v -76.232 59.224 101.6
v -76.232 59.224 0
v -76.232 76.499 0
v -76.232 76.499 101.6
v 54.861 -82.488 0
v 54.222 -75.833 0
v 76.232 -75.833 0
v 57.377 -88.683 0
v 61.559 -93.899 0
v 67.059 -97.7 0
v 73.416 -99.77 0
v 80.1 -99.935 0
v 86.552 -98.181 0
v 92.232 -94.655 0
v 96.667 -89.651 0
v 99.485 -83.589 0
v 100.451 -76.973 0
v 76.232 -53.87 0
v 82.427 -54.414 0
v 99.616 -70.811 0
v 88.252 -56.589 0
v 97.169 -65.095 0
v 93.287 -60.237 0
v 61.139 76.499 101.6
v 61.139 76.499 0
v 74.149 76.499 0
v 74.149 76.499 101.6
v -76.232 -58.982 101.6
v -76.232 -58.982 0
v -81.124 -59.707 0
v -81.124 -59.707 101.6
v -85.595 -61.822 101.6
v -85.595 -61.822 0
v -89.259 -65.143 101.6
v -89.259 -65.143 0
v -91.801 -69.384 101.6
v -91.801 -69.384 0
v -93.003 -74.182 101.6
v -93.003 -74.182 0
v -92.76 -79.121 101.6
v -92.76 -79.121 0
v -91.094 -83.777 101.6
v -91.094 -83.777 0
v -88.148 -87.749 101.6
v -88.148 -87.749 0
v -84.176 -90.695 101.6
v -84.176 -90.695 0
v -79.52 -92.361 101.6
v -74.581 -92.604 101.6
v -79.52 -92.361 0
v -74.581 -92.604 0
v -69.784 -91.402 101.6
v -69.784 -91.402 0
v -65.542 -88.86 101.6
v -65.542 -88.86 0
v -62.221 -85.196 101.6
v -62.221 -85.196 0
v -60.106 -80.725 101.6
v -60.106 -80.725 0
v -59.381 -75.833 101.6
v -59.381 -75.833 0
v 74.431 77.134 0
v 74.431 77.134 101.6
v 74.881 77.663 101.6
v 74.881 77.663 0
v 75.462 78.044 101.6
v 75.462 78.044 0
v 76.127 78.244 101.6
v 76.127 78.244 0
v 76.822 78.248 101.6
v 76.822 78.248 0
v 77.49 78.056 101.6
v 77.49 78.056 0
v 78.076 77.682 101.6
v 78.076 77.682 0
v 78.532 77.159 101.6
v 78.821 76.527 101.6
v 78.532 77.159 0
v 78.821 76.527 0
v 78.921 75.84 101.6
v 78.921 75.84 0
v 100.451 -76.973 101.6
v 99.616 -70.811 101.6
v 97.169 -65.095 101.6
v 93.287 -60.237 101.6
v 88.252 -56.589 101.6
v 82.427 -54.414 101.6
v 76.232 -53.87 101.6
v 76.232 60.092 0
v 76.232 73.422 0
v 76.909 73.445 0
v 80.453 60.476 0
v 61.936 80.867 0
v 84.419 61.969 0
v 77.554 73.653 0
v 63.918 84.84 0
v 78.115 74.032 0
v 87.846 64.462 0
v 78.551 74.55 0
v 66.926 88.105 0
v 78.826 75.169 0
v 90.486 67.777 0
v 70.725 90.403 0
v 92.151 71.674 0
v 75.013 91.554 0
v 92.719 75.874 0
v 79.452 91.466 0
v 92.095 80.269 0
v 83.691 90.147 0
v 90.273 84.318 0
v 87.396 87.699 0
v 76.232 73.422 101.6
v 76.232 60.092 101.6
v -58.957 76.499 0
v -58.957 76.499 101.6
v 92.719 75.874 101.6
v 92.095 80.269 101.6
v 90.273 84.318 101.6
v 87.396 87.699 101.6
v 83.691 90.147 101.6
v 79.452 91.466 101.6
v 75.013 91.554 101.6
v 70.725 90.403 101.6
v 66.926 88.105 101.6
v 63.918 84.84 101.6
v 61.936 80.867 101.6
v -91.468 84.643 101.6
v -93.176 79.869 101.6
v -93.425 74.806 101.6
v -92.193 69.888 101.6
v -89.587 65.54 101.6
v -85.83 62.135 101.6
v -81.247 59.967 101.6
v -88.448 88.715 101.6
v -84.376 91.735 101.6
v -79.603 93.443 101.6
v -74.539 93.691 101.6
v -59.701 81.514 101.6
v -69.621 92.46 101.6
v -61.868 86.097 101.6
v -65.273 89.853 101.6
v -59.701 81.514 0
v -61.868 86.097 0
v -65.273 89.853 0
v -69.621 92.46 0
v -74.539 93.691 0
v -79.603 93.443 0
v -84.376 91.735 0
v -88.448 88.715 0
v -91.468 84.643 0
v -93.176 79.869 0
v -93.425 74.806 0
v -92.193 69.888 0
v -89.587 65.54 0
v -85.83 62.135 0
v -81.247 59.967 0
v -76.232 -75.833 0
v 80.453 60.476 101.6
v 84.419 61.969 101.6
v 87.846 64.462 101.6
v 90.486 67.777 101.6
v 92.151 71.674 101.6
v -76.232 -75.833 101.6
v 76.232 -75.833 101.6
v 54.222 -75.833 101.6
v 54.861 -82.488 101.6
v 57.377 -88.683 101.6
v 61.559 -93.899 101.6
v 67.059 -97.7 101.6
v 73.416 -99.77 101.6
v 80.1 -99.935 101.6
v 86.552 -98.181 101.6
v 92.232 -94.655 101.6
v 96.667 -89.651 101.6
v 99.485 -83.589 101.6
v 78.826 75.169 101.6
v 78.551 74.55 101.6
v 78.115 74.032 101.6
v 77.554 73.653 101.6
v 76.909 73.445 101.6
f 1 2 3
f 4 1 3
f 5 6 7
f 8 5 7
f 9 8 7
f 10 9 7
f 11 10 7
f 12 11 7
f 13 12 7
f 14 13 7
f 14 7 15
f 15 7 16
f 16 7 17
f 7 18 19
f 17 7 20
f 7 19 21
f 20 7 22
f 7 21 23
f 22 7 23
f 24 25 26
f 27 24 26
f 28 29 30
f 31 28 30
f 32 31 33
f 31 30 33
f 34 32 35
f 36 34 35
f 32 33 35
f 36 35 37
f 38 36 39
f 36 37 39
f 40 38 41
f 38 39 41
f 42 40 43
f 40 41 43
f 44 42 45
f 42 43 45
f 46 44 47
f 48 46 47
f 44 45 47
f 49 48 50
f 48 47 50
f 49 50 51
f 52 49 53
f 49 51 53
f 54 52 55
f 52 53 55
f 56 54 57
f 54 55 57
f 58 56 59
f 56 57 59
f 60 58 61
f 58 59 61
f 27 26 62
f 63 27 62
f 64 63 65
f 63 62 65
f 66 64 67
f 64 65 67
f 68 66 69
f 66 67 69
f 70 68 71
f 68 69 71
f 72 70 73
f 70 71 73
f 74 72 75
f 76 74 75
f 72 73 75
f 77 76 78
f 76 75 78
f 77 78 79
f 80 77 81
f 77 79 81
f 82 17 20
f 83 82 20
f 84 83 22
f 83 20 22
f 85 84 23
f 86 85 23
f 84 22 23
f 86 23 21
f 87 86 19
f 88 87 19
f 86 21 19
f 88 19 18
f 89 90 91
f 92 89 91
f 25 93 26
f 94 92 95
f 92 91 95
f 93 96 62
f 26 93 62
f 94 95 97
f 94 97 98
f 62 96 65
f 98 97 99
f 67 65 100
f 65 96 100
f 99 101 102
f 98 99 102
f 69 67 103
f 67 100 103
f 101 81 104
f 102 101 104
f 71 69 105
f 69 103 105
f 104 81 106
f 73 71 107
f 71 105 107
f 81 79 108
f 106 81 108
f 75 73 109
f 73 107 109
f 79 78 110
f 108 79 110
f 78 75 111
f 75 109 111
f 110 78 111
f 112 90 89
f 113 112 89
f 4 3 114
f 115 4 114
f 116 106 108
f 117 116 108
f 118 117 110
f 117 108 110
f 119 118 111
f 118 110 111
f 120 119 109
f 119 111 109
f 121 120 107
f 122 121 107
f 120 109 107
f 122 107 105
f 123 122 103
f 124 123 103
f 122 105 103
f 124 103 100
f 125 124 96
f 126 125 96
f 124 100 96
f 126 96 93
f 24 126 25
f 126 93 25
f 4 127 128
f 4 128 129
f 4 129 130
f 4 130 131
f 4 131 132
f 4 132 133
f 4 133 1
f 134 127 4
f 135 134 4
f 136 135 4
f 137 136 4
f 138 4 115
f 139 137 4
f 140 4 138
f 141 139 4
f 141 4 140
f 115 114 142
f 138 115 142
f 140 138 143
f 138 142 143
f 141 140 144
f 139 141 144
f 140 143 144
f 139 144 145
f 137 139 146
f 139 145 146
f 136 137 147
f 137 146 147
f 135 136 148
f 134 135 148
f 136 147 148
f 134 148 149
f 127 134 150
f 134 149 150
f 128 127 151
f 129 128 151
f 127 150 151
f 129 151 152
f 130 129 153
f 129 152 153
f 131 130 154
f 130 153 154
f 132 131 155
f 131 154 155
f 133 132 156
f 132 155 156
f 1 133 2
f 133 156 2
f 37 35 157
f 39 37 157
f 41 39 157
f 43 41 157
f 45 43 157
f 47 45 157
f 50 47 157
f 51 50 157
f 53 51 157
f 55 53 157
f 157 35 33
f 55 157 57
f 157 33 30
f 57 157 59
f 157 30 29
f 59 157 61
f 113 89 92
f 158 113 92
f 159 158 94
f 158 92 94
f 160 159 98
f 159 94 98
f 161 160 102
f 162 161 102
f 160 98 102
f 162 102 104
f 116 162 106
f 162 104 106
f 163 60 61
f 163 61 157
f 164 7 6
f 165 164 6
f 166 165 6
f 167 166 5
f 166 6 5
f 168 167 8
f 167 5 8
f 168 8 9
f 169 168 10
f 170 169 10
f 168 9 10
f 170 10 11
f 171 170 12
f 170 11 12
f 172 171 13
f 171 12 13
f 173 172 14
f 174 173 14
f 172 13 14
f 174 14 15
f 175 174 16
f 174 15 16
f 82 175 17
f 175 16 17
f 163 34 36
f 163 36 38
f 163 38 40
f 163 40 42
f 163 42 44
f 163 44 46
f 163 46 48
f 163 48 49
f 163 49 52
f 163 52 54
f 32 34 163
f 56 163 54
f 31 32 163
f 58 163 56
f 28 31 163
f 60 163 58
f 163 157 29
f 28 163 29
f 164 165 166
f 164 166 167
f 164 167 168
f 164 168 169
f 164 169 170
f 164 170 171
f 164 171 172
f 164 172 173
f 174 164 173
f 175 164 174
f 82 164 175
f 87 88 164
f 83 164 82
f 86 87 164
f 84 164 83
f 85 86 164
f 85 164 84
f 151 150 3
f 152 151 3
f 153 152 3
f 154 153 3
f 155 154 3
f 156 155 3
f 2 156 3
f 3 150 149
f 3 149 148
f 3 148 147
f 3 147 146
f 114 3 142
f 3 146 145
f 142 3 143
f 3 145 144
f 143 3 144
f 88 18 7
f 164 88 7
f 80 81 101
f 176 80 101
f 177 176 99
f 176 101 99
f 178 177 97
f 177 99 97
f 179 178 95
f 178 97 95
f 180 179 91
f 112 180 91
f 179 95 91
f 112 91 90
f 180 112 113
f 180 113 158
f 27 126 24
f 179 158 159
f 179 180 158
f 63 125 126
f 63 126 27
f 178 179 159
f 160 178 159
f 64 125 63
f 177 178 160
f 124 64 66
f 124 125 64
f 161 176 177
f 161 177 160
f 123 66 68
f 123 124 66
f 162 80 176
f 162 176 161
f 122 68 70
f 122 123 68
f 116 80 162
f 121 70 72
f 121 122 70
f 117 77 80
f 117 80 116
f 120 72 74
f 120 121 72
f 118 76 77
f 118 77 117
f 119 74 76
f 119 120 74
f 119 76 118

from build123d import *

# Parameters (mm, degrees)
F1_DEPTH = 101.6


with BuildPart() as f1:
    # F0 (on Top) → F1 (new body)
    with BuildSketch(Plane.XY):
        with BuildLine():
            Line((-76.2324035168, 59.2235147336), (-76.2324035168, 76.4990895987))
            Line((-76.2324035168, 76.4990895987), (-58.9568286517, 76.4990895987))
            ThreePointArc((-58.9568286517, 76.4990895987), (-88.4480796528, 88.7147657347), (-76.2324035168, 59.2235147336))
        make_face()
    extrude(amount=F1_DEPTH)


with BuildPart() as f1b:
    # F0 (on Top) → F1, piece 2 (new body)
    with BuildSketch(Plane.XY):
        with BuildLine():
            ThreePointArc((92.7193677561, 75.8735761046), (77.2356371082, 91.6670271799), (61.1386597157, 76.4990895987))
            Line((61.1386597157, 76.4990895987), (74.1489473443, 76.4990895987))
            ThreePointArc((74.1489473443, 76.4990895987), (76.822136609, 78.2481926071), (78.9207310251, 75.8396238089))
            ThreePointArc((78.9207310251, 75.8396238089), (78.1152223388, 74.0317847292), (76.2324035168, 73.4217686106))
            Line((76.2324035168, 73.4217686106), (76.2324035168, 60.0921224815))
            ThreePointArc((76.2324035168, 60.0921224815), (87.8458398895, 64.4622410788), (92.7193677561, 75.8735761046))
        make_face()
    extrude(amount=F1_DEPTH)


with BuildPart() as f1c:
    # F0 (on Top) → F1, piece 3 (new body)
    with BuildSketch(Plane.XY):
        with BuildLine():
            Line((-76.2324035168, -75.833261013), (-76.2324035168, -58.9815478394))
            ThreePointArc((-76.2324035168, -58.9815478394), (-88.1483641764, -87.7492216727), (-59.3806903431, -75.833261013))
            Line((-59.3806903431, -75.833261013), (-76.2324035168, -75.833261013))
        make_face()
    extrude(amount=F1_DEPTH)


with BuildPart() as f1d:
    # F0 (on Top) → F1, piece 4 (new body)
    with BuildSketch(Plane.XY):
        with BuildLine():
            ThreePointArc((100.451426673, -76.9730806351), (93.2870674408, -60.2374619665), (76.2324035168, -53.8697768401))
            Line((76.2324035168, -53.8697768401), (76.2324035168, -75.833261013))
            Line((76.2324035168, -75.833261013), (54.2215230223, -75.833261013))
            ThreePointArc((54.2215230223, -75.833261013), (76.7523404516, -100.0950570878), (100.451426673, -76.9730806351))
        make_face()
    extrude(amount=F1_DEPTH)


solid = Compound([f1.part, f1b.part, f1c.part, f1d.part])
